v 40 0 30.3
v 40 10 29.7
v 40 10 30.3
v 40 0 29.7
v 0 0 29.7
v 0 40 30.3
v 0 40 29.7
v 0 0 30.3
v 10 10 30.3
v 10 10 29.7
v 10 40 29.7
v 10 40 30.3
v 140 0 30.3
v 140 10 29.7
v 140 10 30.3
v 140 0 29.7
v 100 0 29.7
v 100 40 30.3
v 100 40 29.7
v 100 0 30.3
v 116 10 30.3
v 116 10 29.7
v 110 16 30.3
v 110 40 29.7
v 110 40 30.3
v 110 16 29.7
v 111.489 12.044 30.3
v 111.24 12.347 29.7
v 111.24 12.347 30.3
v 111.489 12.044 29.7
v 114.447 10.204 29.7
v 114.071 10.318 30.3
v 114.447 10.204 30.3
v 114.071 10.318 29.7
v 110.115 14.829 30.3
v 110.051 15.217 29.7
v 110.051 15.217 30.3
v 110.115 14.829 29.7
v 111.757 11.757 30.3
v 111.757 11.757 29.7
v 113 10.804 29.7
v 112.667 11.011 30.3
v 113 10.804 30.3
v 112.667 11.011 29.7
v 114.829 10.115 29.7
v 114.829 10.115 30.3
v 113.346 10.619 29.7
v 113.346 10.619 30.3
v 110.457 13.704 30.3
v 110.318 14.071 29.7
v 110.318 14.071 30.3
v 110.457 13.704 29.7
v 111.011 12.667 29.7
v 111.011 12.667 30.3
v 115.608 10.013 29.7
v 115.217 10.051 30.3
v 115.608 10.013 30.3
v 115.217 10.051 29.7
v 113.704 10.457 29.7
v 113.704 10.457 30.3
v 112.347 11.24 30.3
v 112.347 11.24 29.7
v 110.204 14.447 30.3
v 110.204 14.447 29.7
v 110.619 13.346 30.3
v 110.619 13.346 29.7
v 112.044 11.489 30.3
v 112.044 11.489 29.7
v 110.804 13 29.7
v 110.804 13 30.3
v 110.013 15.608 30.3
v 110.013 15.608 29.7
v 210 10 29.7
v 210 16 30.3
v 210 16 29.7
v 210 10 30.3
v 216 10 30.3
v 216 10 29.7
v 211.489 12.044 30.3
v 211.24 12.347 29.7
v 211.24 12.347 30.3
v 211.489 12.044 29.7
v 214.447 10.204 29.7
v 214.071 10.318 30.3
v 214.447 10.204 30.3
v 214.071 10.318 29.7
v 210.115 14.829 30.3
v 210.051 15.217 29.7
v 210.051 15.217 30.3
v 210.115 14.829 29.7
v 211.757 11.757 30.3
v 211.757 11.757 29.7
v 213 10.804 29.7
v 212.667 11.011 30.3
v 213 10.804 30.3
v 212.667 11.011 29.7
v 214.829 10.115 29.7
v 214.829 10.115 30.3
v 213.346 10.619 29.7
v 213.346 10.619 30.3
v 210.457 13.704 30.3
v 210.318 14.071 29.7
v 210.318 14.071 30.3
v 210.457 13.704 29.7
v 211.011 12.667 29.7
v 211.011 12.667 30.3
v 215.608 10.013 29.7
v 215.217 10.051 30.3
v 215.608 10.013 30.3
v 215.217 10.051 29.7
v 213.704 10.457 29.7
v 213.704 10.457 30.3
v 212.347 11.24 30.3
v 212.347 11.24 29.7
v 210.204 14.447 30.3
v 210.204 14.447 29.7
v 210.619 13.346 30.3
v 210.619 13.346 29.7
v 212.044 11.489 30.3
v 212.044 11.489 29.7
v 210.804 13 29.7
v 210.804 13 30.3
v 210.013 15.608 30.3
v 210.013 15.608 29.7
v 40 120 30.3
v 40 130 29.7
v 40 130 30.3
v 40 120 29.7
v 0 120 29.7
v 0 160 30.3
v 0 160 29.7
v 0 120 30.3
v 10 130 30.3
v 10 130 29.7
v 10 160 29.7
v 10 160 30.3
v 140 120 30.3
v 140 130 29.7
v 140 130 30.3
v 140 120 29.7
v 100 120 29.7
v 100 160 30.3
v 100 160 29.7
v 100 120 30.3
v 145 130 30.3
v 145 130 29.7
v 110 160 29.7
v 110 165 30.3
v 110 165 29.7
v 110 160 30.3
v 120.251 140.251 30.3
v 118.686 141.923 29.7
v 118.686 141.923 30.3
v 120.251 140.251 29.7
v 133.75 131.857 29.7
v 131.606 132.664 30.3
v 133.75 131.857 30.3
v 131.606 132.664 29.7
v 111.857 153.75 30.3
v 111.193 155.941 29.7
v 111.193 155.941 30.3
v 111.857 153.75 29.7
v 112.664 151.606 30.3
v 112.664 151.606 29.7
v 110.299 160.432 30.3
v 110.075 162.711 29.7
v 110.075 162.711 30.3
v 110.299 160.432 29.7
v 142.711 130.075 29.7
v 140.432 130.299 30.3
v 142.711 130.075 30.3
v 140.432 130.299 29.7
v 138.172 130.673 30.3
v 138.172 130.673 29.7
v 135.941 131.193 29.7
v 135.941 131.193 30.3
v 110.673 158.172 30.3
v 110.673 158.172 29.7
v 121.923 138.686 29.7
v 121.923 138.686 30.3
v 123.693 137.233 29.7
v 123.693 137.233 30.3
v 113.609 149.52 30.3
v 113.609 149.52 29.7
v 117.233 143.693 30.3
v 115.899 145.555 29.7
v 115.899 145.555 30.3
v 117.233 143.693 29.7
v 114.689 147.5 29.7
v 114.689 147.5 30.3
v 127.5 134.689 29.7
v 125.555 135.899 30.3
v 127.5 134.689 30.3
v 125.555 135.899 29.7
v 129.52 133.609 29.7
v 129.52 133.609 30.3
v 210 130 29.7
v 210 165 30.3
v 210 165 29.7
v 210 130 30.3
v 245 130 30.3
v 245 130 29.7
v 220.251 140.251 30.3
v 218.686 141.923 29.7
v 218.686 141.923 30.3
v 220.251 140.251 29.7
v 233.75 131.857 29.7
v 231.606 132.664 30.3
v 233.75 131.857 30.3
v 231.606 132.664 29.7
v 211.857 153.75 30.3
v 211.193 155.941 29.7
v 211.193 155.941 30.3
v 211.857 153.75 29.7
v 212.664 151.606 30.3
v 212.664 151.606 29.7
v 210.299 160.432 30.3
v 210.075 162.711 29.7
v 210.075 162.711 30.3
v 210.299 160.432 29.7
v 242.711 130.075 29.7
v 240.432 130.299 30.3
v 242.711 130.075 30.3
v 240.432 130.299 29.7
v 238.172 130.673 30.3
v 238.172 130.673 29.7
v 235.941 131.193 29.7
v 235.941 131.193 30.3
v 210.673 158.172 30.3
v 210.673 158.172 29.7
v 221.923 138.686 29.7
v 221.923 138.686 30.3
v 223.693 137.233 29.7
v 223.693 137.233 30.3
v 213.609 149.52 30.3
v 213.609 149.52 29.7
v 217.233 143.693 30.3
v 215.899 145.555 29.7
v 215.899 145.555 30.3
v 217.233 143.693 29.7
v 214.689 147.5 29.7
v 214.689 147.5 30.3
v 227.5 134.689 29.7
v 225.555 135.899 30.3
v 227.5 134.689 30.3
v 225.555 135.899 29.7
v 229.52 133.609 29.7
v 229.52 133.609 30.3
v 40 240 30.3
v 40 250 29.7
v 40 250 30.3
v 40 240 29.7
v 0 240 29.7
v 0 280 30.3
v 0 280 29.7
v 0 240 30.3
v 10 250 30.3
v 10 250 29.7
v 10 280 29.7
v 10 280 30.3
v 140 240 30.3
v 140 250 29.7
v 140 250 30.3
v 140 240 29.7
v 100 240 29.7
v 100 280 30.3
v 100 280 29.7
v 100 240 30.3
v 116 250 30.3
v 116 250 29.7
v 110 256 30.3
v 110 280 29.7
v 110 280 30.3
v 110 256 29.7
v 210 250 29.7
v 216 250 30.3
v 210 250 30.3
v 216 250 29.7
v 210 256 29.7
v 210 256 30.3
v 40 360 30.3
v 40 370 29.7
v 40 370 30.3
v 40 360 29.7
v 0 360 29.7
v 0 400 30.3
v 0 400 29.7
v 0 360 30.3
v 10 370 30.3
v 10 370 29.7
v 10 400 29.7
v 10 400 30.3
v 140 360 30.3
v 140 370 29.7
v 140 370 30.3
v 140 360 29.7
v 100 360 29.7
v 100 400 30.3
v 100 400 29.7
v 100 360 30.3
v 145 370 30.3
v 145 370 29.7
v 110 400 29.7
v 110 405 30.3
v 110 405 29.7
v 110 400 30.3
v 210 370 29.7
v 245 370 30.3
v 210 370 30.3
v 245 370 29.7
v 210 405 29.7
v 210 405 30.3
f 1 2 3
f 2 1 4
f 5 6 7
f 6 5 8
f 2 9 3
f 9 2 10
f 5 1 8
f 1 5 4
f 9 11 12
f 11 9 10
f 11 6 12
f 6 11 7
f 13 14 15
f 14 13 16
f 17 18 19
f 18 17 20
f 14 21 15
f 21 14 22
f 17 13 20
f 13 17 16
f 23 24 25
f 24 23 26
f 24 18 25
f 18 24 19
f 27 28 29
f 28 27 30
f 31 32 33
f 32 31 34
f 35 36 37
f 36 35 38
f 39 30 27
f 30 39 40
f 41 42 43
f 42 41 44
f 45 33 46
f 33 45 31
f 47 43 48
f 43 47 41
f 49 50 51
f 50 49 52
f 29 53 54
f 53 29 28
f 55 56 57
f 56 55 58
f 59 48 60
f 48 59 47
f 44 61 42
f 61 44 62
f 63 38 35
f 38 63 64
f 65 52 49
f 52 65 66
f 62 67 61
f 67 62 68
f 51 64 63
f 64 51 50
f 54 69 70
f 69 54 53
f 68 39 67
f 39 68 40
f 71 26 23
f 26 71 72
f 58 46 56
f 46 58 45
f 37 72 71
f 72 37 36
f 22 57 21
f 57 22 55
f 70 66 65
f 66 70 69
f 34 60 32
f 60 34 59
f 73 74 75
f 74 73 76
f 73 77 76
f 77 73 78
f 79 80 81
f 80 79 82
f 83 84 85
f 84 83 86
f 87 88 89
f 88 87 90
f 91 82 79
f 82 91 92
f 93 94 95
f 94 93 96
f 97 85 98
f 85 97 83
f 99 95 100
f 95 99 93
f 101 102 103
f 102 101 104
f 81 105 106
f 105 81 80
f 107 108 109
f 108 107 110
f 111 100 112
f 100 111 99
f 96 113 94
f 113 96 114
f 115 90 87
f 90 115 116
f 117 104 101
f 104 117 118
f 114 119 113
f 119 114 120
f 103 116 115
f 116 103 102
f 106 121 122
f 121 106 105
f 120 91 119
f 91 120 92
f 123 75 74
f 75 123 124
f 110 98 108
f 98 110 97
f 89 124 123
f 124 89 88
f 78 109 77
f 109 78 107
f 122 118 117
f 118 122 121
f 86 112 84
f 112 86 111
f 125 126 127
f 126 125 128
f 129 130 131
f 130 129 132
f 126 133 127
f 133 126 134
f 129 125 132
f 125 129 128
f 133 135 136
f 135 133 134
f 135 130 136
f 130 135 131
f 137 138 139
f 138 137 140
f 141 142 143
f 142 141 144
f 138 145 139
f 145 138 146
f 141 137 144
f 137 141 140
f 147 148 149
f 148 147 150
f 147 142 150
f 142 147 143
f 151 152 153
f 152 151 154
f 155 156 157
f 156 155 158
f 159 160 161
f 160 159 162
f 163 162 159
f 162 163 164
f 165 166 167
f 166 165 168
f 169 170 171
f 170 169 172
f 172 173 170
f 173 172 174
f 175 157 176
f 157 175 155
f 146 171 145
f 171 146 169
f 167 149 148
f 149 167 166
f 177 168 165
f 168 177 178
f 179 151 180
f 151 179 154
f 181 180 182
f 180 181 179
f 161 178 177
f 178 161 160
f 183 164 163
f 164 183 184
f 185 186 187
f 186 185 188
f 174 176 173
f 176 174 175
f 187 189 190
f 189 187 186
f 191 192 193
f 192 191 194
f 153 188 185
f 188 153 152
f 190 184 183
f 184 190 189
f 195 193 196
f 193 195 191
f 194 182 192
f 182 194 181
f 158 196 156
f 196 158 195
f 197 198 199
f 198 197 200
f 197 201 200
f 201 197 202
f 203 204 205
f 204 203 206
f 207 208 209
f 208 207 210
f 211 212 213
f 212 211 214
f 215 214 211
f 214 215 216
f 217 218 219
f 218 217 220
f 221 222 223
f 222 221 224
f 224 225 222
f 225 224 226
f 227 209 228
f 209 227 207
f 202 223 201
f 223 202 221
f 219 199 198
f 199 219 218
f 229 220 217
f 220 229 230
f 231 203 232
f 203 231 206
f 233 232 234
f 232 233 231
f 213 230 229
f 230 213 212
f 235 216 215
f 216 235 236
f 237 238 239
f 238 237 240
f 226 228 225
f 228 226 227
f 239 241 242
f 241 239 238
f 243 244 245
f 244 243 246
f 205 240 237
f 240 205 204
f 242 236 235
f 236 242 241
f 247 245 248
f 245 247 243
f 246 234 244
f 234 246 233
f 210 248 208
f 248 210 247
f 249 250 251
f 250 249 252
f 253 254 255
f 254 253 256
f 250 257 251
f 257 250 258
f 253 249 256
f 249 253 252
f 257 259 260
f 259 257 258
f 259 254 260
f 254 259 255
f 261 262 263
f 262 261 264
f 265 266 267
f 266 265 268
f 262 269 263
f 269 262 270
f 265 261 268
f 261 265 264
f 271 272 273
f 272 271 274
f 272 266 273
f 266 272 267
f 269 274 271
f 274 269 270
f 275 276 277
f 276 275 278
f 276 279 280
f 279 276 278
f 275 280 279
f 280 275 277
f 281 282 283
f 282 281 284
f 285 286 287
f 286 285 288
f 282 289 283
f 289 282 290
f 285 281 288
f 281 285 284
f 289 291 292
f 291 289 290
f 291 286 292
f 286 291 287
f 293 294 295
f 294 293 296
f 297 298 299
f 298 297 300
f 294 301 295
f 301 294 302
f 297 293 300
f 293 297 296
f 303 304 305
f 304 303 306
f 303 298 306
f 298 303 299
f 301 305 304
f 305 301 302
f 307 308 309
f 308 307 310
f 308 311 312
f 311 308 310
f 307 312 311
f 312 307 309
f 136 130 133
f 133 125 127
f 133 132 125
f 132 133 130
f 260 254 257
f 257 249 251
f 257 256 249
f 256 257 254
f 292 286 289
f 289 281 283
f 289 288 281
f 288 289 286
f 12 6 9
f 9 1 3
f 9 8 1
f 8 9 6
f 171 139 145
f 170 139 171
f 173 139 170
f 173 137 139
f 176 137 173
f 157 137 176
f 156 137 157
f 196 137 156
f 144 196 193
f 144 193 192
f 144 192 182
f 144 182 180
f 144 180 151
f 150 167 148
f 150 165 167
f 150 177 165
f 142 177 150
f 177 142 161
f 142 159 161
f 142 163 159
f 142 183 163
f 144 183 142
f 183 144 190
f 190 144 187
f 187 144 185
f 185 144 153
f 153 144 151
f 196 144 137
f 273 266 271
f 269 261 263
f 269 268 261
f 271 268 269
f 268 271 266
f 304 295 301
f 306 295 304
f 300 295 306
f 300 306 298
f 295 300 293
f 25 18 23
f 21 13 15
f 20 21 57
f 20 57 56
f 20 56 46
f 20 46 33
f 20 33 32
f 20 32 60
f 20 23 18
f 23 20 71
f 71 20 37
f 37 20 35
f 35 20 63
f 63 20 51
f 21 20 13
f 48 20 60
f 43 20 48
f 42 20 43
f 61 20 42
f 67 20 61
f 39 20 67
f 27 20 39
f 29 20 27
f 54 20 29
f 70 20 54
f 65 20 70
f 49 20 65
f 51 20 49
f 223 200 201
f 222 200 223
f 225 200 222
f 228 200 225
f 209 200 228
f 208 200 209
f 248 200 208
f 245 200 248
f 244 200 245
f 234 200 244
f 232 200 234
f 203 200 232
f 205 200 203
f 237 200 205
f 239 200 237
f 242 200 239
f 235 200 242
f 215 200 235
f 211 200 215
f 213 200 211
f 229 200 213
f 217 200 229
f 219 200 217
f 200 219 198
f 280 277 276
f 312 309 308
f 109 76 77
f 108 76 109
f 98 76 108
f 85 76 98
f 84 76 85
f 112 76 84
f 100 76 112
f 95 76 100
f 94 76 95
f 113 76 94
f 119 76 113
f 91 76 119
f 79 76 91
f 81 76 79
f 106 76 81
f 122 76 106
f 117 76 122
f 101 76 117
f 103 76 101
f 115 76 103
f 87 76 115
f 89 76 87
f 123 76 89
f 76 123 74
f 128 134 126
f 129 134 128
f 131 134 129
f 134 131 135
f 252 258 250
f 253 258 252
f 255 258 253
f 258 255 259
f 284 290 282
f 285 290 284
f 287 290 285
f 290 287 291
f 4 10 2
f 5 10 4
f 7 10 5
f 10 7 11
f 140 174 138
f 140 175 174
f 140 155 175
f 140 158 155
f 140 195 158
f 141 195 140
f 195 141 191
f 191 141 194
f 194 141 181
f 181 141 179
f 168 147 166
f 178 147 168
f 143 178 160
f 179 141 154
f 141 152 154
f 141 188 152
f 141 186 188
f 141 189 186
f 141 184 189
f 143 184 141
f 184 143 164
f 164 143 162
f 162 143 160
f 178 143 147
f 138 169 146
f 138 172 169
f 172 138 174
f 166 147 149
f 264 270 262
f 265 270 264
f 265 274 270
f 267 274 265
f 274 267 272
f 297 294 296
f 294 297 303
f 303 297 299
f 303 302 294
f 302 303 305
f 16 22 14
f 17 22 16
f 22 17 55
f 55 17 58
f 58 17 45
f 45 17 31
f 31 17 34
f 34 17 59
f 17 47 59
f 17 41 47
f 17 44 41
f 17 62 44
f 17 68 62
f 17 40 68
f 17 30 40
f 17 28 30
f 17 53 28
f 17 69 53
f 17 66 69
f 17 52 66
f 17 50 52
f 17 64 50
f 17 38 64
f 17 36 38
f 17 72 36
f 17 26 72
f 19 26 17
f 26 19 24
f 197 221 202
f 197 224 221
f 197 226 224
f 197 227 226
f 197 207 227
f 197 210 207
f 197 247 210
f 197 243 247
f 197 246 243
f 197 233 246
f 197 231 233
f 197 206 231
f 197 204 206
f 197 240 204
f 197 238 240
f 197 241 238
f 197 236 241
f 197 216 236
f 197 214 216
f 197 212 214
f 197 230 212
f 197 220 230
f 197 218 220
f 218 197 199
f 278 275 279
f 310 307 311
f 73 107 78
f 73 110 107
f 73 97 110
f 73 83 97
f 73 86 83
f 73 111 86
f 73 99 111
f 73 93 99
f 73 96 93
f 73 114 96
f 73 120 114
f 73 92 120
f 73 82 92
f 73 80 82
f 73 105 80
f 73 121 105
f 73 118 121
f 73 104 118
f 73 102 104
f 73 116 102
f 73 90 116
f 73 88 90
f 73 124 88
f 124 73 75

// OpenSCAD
// file: _fillet_ref.scad
// -----------------------------------------------------------------------------
// M1 visual harness — shared reference tools + cross-cut viewer
//
// These are HAND-WRITTEN reference fillet/round/chamfer tools built from the
// classic OpenSCAD idioms (annulus - torus, wedge - cylinder, ...). They do NOT
// depend on the fillet_tool/round_tool nodes, so they render today and give the
// known-good target that later milestones (M5, M7) must reproduce.
//
// Convention for every case: geometry is built so the feature EDGE runs along Z,
// and we take a thin-slab horizontal cross-section (normal +Z). One image then
// shows, side by side along X:
//     [ base model ] [ applied result ] [ isolated tool solid ]
// and, stacked along Y, a small radius and a large radius (>= surface extent).
// -----------------------------------------------------------------------------

// Thin-slab section: intersect children with a thin horizontal slab at height z.
// XY size is deliberately huge so it covers the whole laid-out scene; only z and
// thickness matter for what the section shows.
module fillet_section(z = 0, thickness = 0.6, extent = 4000) {
  intersection() {
    children();
    translate([0, 0, z]) cube([extent, extent, thickness], center = true);
  }
}

// Vertical thin-slab section (normal +Y), for axis-symmetric ring features where
// a cut through the axis shows the rho-z profile and the ring fillet on both sides.
module fillet_vsection(y = 0, thickness = 0.6, extent = 4000) {
  intersection() {
    children();
    translate([0, y, 0]) cube([extent, thickness, extent], center = true);
  }
}

// Stack several thin-slab sections at different heights, translated apart along
// +Y so the section EVOLVING toward a junction is visible at a glance (used for
// the 3-/4-face meeting-point cases).
module fillet_contour_stack(zs, thickness = 0.6, spacing = 90, extent = 4000) {
  for (i = [0 : len(zs) - 1])
    translate([0, i * spacing, 0])
      fillet_section(z = zs[i], thickness = thickness, extent = extent)
        children();
}

// ---- reference tools for a single 90-degree edge running along Z -------------

// Inner (concave) fillet bead. Faces are x = cx (material x < cx) and y = cy
// (material y < cy); the reentrant quadrant opens toward +x,+y. Union this with
// the model. Cross-section = corner square minus a quarter disc (= a fillet).
module ref_fillet_edge_z(cx, cy, r, h, z0 = 0) {
  translate([0, 0, z0])
    difference() {
      translate([cx, cy, 0]) cube([r, r, h]);
      translate([cx + r, cy + r, -1]) cylinder(r = r, h = h + 2);
    }
}

// Outer (convex) round tool. Convex corner at (cx,cy), material x < cx & y < cy.
// SUBTRACT this from the model; it is the sharp corner sliver outside the arc.
module ref_round_edge_z(cx, cy, r, h, z0 = 0) {
  translate([0, 0, z0])
    difference() {
      translate([cx - r, cy - r, 0]) cube([r, r, h]);
      translate([cx - r, cy - r, -1]) cylinder(r = r, h = h + 2);
    }
}

// Inner (concave) chamfer bead — the wedge alone, no arc. Union with the model.
module ref_chamfer_edge_z(cx, cy, t, h, z0 = 0) {
  translate([0, 0, z0])
    linear_extrude(h)
      polygon([[cx, cy], [cx + t, cy], [cx, cy + t]]);
}
// main file
// Case A — inner 90-degree corner (two cubes forming an L), edge along Z.
// Inner FILLET and inner CHAMFER, each at a small and a large radius.
//
// Read the rendered top-view (thin-slab section at z = 30) as a grid:
//   columns  ->  [ base model ] [ applied result ] [ isolated tool ]
//   rows     ->  fillet r=small, fillet r=large, chamfer t=small, chamfer t=large
// The large radius (35) deliberately exceeds the 30 mm face, so the bead pokes
// past the arm end — the §6.5 clamp/overflow case, made visible.

include <_fillet_ref.scad>;

$fn = 96;

H  = 60;    // extrusion height (edge length along Z)
dx = 100;   // column spacing (the "100 mm offset" for the isolated tool)
dy = 120;   // row spacing
CX = 10;    // inner corner x
CY = 10;    // inner corner y

r_small = 6;
r_large = 35;

module Lmodel(h = H) {
  cube([40, CY, h]);   // horizontal arm  x[0,40] y[0,10]
  cube([CX, 40, h]);   // vertical arm    x[0,10] y[0,40]
}

module tool(size, kind, h = H) {
  if (kind == "fillet")  ref_fillet_edge_z(CX, CY, size, h);
  if (kind == "chamfer") ref_chamfer_edge_z(CX, CY, size, h);
}

// one row: model | (model + tool) | tool
module row(size, kind) {
  Lmodel();
  translate([dx, 0, 0])     { Lmodel(); tool(size, kind); }
  translate([2 * dx, 0, 0]) tool(size, kind);
}

fillet_section(z = H / 2) {
  translate([0, 0 * dy, 0]) row(r_small, "fillet");
  translate([0, 1 * dy, 0]) row(r_large, "fillet");
  translate([0, 2 * dy, 0]) row(r_small, "chamfer");
  translate([0, 3 * dy, 0]) row(r_large, "chamfer");
}
